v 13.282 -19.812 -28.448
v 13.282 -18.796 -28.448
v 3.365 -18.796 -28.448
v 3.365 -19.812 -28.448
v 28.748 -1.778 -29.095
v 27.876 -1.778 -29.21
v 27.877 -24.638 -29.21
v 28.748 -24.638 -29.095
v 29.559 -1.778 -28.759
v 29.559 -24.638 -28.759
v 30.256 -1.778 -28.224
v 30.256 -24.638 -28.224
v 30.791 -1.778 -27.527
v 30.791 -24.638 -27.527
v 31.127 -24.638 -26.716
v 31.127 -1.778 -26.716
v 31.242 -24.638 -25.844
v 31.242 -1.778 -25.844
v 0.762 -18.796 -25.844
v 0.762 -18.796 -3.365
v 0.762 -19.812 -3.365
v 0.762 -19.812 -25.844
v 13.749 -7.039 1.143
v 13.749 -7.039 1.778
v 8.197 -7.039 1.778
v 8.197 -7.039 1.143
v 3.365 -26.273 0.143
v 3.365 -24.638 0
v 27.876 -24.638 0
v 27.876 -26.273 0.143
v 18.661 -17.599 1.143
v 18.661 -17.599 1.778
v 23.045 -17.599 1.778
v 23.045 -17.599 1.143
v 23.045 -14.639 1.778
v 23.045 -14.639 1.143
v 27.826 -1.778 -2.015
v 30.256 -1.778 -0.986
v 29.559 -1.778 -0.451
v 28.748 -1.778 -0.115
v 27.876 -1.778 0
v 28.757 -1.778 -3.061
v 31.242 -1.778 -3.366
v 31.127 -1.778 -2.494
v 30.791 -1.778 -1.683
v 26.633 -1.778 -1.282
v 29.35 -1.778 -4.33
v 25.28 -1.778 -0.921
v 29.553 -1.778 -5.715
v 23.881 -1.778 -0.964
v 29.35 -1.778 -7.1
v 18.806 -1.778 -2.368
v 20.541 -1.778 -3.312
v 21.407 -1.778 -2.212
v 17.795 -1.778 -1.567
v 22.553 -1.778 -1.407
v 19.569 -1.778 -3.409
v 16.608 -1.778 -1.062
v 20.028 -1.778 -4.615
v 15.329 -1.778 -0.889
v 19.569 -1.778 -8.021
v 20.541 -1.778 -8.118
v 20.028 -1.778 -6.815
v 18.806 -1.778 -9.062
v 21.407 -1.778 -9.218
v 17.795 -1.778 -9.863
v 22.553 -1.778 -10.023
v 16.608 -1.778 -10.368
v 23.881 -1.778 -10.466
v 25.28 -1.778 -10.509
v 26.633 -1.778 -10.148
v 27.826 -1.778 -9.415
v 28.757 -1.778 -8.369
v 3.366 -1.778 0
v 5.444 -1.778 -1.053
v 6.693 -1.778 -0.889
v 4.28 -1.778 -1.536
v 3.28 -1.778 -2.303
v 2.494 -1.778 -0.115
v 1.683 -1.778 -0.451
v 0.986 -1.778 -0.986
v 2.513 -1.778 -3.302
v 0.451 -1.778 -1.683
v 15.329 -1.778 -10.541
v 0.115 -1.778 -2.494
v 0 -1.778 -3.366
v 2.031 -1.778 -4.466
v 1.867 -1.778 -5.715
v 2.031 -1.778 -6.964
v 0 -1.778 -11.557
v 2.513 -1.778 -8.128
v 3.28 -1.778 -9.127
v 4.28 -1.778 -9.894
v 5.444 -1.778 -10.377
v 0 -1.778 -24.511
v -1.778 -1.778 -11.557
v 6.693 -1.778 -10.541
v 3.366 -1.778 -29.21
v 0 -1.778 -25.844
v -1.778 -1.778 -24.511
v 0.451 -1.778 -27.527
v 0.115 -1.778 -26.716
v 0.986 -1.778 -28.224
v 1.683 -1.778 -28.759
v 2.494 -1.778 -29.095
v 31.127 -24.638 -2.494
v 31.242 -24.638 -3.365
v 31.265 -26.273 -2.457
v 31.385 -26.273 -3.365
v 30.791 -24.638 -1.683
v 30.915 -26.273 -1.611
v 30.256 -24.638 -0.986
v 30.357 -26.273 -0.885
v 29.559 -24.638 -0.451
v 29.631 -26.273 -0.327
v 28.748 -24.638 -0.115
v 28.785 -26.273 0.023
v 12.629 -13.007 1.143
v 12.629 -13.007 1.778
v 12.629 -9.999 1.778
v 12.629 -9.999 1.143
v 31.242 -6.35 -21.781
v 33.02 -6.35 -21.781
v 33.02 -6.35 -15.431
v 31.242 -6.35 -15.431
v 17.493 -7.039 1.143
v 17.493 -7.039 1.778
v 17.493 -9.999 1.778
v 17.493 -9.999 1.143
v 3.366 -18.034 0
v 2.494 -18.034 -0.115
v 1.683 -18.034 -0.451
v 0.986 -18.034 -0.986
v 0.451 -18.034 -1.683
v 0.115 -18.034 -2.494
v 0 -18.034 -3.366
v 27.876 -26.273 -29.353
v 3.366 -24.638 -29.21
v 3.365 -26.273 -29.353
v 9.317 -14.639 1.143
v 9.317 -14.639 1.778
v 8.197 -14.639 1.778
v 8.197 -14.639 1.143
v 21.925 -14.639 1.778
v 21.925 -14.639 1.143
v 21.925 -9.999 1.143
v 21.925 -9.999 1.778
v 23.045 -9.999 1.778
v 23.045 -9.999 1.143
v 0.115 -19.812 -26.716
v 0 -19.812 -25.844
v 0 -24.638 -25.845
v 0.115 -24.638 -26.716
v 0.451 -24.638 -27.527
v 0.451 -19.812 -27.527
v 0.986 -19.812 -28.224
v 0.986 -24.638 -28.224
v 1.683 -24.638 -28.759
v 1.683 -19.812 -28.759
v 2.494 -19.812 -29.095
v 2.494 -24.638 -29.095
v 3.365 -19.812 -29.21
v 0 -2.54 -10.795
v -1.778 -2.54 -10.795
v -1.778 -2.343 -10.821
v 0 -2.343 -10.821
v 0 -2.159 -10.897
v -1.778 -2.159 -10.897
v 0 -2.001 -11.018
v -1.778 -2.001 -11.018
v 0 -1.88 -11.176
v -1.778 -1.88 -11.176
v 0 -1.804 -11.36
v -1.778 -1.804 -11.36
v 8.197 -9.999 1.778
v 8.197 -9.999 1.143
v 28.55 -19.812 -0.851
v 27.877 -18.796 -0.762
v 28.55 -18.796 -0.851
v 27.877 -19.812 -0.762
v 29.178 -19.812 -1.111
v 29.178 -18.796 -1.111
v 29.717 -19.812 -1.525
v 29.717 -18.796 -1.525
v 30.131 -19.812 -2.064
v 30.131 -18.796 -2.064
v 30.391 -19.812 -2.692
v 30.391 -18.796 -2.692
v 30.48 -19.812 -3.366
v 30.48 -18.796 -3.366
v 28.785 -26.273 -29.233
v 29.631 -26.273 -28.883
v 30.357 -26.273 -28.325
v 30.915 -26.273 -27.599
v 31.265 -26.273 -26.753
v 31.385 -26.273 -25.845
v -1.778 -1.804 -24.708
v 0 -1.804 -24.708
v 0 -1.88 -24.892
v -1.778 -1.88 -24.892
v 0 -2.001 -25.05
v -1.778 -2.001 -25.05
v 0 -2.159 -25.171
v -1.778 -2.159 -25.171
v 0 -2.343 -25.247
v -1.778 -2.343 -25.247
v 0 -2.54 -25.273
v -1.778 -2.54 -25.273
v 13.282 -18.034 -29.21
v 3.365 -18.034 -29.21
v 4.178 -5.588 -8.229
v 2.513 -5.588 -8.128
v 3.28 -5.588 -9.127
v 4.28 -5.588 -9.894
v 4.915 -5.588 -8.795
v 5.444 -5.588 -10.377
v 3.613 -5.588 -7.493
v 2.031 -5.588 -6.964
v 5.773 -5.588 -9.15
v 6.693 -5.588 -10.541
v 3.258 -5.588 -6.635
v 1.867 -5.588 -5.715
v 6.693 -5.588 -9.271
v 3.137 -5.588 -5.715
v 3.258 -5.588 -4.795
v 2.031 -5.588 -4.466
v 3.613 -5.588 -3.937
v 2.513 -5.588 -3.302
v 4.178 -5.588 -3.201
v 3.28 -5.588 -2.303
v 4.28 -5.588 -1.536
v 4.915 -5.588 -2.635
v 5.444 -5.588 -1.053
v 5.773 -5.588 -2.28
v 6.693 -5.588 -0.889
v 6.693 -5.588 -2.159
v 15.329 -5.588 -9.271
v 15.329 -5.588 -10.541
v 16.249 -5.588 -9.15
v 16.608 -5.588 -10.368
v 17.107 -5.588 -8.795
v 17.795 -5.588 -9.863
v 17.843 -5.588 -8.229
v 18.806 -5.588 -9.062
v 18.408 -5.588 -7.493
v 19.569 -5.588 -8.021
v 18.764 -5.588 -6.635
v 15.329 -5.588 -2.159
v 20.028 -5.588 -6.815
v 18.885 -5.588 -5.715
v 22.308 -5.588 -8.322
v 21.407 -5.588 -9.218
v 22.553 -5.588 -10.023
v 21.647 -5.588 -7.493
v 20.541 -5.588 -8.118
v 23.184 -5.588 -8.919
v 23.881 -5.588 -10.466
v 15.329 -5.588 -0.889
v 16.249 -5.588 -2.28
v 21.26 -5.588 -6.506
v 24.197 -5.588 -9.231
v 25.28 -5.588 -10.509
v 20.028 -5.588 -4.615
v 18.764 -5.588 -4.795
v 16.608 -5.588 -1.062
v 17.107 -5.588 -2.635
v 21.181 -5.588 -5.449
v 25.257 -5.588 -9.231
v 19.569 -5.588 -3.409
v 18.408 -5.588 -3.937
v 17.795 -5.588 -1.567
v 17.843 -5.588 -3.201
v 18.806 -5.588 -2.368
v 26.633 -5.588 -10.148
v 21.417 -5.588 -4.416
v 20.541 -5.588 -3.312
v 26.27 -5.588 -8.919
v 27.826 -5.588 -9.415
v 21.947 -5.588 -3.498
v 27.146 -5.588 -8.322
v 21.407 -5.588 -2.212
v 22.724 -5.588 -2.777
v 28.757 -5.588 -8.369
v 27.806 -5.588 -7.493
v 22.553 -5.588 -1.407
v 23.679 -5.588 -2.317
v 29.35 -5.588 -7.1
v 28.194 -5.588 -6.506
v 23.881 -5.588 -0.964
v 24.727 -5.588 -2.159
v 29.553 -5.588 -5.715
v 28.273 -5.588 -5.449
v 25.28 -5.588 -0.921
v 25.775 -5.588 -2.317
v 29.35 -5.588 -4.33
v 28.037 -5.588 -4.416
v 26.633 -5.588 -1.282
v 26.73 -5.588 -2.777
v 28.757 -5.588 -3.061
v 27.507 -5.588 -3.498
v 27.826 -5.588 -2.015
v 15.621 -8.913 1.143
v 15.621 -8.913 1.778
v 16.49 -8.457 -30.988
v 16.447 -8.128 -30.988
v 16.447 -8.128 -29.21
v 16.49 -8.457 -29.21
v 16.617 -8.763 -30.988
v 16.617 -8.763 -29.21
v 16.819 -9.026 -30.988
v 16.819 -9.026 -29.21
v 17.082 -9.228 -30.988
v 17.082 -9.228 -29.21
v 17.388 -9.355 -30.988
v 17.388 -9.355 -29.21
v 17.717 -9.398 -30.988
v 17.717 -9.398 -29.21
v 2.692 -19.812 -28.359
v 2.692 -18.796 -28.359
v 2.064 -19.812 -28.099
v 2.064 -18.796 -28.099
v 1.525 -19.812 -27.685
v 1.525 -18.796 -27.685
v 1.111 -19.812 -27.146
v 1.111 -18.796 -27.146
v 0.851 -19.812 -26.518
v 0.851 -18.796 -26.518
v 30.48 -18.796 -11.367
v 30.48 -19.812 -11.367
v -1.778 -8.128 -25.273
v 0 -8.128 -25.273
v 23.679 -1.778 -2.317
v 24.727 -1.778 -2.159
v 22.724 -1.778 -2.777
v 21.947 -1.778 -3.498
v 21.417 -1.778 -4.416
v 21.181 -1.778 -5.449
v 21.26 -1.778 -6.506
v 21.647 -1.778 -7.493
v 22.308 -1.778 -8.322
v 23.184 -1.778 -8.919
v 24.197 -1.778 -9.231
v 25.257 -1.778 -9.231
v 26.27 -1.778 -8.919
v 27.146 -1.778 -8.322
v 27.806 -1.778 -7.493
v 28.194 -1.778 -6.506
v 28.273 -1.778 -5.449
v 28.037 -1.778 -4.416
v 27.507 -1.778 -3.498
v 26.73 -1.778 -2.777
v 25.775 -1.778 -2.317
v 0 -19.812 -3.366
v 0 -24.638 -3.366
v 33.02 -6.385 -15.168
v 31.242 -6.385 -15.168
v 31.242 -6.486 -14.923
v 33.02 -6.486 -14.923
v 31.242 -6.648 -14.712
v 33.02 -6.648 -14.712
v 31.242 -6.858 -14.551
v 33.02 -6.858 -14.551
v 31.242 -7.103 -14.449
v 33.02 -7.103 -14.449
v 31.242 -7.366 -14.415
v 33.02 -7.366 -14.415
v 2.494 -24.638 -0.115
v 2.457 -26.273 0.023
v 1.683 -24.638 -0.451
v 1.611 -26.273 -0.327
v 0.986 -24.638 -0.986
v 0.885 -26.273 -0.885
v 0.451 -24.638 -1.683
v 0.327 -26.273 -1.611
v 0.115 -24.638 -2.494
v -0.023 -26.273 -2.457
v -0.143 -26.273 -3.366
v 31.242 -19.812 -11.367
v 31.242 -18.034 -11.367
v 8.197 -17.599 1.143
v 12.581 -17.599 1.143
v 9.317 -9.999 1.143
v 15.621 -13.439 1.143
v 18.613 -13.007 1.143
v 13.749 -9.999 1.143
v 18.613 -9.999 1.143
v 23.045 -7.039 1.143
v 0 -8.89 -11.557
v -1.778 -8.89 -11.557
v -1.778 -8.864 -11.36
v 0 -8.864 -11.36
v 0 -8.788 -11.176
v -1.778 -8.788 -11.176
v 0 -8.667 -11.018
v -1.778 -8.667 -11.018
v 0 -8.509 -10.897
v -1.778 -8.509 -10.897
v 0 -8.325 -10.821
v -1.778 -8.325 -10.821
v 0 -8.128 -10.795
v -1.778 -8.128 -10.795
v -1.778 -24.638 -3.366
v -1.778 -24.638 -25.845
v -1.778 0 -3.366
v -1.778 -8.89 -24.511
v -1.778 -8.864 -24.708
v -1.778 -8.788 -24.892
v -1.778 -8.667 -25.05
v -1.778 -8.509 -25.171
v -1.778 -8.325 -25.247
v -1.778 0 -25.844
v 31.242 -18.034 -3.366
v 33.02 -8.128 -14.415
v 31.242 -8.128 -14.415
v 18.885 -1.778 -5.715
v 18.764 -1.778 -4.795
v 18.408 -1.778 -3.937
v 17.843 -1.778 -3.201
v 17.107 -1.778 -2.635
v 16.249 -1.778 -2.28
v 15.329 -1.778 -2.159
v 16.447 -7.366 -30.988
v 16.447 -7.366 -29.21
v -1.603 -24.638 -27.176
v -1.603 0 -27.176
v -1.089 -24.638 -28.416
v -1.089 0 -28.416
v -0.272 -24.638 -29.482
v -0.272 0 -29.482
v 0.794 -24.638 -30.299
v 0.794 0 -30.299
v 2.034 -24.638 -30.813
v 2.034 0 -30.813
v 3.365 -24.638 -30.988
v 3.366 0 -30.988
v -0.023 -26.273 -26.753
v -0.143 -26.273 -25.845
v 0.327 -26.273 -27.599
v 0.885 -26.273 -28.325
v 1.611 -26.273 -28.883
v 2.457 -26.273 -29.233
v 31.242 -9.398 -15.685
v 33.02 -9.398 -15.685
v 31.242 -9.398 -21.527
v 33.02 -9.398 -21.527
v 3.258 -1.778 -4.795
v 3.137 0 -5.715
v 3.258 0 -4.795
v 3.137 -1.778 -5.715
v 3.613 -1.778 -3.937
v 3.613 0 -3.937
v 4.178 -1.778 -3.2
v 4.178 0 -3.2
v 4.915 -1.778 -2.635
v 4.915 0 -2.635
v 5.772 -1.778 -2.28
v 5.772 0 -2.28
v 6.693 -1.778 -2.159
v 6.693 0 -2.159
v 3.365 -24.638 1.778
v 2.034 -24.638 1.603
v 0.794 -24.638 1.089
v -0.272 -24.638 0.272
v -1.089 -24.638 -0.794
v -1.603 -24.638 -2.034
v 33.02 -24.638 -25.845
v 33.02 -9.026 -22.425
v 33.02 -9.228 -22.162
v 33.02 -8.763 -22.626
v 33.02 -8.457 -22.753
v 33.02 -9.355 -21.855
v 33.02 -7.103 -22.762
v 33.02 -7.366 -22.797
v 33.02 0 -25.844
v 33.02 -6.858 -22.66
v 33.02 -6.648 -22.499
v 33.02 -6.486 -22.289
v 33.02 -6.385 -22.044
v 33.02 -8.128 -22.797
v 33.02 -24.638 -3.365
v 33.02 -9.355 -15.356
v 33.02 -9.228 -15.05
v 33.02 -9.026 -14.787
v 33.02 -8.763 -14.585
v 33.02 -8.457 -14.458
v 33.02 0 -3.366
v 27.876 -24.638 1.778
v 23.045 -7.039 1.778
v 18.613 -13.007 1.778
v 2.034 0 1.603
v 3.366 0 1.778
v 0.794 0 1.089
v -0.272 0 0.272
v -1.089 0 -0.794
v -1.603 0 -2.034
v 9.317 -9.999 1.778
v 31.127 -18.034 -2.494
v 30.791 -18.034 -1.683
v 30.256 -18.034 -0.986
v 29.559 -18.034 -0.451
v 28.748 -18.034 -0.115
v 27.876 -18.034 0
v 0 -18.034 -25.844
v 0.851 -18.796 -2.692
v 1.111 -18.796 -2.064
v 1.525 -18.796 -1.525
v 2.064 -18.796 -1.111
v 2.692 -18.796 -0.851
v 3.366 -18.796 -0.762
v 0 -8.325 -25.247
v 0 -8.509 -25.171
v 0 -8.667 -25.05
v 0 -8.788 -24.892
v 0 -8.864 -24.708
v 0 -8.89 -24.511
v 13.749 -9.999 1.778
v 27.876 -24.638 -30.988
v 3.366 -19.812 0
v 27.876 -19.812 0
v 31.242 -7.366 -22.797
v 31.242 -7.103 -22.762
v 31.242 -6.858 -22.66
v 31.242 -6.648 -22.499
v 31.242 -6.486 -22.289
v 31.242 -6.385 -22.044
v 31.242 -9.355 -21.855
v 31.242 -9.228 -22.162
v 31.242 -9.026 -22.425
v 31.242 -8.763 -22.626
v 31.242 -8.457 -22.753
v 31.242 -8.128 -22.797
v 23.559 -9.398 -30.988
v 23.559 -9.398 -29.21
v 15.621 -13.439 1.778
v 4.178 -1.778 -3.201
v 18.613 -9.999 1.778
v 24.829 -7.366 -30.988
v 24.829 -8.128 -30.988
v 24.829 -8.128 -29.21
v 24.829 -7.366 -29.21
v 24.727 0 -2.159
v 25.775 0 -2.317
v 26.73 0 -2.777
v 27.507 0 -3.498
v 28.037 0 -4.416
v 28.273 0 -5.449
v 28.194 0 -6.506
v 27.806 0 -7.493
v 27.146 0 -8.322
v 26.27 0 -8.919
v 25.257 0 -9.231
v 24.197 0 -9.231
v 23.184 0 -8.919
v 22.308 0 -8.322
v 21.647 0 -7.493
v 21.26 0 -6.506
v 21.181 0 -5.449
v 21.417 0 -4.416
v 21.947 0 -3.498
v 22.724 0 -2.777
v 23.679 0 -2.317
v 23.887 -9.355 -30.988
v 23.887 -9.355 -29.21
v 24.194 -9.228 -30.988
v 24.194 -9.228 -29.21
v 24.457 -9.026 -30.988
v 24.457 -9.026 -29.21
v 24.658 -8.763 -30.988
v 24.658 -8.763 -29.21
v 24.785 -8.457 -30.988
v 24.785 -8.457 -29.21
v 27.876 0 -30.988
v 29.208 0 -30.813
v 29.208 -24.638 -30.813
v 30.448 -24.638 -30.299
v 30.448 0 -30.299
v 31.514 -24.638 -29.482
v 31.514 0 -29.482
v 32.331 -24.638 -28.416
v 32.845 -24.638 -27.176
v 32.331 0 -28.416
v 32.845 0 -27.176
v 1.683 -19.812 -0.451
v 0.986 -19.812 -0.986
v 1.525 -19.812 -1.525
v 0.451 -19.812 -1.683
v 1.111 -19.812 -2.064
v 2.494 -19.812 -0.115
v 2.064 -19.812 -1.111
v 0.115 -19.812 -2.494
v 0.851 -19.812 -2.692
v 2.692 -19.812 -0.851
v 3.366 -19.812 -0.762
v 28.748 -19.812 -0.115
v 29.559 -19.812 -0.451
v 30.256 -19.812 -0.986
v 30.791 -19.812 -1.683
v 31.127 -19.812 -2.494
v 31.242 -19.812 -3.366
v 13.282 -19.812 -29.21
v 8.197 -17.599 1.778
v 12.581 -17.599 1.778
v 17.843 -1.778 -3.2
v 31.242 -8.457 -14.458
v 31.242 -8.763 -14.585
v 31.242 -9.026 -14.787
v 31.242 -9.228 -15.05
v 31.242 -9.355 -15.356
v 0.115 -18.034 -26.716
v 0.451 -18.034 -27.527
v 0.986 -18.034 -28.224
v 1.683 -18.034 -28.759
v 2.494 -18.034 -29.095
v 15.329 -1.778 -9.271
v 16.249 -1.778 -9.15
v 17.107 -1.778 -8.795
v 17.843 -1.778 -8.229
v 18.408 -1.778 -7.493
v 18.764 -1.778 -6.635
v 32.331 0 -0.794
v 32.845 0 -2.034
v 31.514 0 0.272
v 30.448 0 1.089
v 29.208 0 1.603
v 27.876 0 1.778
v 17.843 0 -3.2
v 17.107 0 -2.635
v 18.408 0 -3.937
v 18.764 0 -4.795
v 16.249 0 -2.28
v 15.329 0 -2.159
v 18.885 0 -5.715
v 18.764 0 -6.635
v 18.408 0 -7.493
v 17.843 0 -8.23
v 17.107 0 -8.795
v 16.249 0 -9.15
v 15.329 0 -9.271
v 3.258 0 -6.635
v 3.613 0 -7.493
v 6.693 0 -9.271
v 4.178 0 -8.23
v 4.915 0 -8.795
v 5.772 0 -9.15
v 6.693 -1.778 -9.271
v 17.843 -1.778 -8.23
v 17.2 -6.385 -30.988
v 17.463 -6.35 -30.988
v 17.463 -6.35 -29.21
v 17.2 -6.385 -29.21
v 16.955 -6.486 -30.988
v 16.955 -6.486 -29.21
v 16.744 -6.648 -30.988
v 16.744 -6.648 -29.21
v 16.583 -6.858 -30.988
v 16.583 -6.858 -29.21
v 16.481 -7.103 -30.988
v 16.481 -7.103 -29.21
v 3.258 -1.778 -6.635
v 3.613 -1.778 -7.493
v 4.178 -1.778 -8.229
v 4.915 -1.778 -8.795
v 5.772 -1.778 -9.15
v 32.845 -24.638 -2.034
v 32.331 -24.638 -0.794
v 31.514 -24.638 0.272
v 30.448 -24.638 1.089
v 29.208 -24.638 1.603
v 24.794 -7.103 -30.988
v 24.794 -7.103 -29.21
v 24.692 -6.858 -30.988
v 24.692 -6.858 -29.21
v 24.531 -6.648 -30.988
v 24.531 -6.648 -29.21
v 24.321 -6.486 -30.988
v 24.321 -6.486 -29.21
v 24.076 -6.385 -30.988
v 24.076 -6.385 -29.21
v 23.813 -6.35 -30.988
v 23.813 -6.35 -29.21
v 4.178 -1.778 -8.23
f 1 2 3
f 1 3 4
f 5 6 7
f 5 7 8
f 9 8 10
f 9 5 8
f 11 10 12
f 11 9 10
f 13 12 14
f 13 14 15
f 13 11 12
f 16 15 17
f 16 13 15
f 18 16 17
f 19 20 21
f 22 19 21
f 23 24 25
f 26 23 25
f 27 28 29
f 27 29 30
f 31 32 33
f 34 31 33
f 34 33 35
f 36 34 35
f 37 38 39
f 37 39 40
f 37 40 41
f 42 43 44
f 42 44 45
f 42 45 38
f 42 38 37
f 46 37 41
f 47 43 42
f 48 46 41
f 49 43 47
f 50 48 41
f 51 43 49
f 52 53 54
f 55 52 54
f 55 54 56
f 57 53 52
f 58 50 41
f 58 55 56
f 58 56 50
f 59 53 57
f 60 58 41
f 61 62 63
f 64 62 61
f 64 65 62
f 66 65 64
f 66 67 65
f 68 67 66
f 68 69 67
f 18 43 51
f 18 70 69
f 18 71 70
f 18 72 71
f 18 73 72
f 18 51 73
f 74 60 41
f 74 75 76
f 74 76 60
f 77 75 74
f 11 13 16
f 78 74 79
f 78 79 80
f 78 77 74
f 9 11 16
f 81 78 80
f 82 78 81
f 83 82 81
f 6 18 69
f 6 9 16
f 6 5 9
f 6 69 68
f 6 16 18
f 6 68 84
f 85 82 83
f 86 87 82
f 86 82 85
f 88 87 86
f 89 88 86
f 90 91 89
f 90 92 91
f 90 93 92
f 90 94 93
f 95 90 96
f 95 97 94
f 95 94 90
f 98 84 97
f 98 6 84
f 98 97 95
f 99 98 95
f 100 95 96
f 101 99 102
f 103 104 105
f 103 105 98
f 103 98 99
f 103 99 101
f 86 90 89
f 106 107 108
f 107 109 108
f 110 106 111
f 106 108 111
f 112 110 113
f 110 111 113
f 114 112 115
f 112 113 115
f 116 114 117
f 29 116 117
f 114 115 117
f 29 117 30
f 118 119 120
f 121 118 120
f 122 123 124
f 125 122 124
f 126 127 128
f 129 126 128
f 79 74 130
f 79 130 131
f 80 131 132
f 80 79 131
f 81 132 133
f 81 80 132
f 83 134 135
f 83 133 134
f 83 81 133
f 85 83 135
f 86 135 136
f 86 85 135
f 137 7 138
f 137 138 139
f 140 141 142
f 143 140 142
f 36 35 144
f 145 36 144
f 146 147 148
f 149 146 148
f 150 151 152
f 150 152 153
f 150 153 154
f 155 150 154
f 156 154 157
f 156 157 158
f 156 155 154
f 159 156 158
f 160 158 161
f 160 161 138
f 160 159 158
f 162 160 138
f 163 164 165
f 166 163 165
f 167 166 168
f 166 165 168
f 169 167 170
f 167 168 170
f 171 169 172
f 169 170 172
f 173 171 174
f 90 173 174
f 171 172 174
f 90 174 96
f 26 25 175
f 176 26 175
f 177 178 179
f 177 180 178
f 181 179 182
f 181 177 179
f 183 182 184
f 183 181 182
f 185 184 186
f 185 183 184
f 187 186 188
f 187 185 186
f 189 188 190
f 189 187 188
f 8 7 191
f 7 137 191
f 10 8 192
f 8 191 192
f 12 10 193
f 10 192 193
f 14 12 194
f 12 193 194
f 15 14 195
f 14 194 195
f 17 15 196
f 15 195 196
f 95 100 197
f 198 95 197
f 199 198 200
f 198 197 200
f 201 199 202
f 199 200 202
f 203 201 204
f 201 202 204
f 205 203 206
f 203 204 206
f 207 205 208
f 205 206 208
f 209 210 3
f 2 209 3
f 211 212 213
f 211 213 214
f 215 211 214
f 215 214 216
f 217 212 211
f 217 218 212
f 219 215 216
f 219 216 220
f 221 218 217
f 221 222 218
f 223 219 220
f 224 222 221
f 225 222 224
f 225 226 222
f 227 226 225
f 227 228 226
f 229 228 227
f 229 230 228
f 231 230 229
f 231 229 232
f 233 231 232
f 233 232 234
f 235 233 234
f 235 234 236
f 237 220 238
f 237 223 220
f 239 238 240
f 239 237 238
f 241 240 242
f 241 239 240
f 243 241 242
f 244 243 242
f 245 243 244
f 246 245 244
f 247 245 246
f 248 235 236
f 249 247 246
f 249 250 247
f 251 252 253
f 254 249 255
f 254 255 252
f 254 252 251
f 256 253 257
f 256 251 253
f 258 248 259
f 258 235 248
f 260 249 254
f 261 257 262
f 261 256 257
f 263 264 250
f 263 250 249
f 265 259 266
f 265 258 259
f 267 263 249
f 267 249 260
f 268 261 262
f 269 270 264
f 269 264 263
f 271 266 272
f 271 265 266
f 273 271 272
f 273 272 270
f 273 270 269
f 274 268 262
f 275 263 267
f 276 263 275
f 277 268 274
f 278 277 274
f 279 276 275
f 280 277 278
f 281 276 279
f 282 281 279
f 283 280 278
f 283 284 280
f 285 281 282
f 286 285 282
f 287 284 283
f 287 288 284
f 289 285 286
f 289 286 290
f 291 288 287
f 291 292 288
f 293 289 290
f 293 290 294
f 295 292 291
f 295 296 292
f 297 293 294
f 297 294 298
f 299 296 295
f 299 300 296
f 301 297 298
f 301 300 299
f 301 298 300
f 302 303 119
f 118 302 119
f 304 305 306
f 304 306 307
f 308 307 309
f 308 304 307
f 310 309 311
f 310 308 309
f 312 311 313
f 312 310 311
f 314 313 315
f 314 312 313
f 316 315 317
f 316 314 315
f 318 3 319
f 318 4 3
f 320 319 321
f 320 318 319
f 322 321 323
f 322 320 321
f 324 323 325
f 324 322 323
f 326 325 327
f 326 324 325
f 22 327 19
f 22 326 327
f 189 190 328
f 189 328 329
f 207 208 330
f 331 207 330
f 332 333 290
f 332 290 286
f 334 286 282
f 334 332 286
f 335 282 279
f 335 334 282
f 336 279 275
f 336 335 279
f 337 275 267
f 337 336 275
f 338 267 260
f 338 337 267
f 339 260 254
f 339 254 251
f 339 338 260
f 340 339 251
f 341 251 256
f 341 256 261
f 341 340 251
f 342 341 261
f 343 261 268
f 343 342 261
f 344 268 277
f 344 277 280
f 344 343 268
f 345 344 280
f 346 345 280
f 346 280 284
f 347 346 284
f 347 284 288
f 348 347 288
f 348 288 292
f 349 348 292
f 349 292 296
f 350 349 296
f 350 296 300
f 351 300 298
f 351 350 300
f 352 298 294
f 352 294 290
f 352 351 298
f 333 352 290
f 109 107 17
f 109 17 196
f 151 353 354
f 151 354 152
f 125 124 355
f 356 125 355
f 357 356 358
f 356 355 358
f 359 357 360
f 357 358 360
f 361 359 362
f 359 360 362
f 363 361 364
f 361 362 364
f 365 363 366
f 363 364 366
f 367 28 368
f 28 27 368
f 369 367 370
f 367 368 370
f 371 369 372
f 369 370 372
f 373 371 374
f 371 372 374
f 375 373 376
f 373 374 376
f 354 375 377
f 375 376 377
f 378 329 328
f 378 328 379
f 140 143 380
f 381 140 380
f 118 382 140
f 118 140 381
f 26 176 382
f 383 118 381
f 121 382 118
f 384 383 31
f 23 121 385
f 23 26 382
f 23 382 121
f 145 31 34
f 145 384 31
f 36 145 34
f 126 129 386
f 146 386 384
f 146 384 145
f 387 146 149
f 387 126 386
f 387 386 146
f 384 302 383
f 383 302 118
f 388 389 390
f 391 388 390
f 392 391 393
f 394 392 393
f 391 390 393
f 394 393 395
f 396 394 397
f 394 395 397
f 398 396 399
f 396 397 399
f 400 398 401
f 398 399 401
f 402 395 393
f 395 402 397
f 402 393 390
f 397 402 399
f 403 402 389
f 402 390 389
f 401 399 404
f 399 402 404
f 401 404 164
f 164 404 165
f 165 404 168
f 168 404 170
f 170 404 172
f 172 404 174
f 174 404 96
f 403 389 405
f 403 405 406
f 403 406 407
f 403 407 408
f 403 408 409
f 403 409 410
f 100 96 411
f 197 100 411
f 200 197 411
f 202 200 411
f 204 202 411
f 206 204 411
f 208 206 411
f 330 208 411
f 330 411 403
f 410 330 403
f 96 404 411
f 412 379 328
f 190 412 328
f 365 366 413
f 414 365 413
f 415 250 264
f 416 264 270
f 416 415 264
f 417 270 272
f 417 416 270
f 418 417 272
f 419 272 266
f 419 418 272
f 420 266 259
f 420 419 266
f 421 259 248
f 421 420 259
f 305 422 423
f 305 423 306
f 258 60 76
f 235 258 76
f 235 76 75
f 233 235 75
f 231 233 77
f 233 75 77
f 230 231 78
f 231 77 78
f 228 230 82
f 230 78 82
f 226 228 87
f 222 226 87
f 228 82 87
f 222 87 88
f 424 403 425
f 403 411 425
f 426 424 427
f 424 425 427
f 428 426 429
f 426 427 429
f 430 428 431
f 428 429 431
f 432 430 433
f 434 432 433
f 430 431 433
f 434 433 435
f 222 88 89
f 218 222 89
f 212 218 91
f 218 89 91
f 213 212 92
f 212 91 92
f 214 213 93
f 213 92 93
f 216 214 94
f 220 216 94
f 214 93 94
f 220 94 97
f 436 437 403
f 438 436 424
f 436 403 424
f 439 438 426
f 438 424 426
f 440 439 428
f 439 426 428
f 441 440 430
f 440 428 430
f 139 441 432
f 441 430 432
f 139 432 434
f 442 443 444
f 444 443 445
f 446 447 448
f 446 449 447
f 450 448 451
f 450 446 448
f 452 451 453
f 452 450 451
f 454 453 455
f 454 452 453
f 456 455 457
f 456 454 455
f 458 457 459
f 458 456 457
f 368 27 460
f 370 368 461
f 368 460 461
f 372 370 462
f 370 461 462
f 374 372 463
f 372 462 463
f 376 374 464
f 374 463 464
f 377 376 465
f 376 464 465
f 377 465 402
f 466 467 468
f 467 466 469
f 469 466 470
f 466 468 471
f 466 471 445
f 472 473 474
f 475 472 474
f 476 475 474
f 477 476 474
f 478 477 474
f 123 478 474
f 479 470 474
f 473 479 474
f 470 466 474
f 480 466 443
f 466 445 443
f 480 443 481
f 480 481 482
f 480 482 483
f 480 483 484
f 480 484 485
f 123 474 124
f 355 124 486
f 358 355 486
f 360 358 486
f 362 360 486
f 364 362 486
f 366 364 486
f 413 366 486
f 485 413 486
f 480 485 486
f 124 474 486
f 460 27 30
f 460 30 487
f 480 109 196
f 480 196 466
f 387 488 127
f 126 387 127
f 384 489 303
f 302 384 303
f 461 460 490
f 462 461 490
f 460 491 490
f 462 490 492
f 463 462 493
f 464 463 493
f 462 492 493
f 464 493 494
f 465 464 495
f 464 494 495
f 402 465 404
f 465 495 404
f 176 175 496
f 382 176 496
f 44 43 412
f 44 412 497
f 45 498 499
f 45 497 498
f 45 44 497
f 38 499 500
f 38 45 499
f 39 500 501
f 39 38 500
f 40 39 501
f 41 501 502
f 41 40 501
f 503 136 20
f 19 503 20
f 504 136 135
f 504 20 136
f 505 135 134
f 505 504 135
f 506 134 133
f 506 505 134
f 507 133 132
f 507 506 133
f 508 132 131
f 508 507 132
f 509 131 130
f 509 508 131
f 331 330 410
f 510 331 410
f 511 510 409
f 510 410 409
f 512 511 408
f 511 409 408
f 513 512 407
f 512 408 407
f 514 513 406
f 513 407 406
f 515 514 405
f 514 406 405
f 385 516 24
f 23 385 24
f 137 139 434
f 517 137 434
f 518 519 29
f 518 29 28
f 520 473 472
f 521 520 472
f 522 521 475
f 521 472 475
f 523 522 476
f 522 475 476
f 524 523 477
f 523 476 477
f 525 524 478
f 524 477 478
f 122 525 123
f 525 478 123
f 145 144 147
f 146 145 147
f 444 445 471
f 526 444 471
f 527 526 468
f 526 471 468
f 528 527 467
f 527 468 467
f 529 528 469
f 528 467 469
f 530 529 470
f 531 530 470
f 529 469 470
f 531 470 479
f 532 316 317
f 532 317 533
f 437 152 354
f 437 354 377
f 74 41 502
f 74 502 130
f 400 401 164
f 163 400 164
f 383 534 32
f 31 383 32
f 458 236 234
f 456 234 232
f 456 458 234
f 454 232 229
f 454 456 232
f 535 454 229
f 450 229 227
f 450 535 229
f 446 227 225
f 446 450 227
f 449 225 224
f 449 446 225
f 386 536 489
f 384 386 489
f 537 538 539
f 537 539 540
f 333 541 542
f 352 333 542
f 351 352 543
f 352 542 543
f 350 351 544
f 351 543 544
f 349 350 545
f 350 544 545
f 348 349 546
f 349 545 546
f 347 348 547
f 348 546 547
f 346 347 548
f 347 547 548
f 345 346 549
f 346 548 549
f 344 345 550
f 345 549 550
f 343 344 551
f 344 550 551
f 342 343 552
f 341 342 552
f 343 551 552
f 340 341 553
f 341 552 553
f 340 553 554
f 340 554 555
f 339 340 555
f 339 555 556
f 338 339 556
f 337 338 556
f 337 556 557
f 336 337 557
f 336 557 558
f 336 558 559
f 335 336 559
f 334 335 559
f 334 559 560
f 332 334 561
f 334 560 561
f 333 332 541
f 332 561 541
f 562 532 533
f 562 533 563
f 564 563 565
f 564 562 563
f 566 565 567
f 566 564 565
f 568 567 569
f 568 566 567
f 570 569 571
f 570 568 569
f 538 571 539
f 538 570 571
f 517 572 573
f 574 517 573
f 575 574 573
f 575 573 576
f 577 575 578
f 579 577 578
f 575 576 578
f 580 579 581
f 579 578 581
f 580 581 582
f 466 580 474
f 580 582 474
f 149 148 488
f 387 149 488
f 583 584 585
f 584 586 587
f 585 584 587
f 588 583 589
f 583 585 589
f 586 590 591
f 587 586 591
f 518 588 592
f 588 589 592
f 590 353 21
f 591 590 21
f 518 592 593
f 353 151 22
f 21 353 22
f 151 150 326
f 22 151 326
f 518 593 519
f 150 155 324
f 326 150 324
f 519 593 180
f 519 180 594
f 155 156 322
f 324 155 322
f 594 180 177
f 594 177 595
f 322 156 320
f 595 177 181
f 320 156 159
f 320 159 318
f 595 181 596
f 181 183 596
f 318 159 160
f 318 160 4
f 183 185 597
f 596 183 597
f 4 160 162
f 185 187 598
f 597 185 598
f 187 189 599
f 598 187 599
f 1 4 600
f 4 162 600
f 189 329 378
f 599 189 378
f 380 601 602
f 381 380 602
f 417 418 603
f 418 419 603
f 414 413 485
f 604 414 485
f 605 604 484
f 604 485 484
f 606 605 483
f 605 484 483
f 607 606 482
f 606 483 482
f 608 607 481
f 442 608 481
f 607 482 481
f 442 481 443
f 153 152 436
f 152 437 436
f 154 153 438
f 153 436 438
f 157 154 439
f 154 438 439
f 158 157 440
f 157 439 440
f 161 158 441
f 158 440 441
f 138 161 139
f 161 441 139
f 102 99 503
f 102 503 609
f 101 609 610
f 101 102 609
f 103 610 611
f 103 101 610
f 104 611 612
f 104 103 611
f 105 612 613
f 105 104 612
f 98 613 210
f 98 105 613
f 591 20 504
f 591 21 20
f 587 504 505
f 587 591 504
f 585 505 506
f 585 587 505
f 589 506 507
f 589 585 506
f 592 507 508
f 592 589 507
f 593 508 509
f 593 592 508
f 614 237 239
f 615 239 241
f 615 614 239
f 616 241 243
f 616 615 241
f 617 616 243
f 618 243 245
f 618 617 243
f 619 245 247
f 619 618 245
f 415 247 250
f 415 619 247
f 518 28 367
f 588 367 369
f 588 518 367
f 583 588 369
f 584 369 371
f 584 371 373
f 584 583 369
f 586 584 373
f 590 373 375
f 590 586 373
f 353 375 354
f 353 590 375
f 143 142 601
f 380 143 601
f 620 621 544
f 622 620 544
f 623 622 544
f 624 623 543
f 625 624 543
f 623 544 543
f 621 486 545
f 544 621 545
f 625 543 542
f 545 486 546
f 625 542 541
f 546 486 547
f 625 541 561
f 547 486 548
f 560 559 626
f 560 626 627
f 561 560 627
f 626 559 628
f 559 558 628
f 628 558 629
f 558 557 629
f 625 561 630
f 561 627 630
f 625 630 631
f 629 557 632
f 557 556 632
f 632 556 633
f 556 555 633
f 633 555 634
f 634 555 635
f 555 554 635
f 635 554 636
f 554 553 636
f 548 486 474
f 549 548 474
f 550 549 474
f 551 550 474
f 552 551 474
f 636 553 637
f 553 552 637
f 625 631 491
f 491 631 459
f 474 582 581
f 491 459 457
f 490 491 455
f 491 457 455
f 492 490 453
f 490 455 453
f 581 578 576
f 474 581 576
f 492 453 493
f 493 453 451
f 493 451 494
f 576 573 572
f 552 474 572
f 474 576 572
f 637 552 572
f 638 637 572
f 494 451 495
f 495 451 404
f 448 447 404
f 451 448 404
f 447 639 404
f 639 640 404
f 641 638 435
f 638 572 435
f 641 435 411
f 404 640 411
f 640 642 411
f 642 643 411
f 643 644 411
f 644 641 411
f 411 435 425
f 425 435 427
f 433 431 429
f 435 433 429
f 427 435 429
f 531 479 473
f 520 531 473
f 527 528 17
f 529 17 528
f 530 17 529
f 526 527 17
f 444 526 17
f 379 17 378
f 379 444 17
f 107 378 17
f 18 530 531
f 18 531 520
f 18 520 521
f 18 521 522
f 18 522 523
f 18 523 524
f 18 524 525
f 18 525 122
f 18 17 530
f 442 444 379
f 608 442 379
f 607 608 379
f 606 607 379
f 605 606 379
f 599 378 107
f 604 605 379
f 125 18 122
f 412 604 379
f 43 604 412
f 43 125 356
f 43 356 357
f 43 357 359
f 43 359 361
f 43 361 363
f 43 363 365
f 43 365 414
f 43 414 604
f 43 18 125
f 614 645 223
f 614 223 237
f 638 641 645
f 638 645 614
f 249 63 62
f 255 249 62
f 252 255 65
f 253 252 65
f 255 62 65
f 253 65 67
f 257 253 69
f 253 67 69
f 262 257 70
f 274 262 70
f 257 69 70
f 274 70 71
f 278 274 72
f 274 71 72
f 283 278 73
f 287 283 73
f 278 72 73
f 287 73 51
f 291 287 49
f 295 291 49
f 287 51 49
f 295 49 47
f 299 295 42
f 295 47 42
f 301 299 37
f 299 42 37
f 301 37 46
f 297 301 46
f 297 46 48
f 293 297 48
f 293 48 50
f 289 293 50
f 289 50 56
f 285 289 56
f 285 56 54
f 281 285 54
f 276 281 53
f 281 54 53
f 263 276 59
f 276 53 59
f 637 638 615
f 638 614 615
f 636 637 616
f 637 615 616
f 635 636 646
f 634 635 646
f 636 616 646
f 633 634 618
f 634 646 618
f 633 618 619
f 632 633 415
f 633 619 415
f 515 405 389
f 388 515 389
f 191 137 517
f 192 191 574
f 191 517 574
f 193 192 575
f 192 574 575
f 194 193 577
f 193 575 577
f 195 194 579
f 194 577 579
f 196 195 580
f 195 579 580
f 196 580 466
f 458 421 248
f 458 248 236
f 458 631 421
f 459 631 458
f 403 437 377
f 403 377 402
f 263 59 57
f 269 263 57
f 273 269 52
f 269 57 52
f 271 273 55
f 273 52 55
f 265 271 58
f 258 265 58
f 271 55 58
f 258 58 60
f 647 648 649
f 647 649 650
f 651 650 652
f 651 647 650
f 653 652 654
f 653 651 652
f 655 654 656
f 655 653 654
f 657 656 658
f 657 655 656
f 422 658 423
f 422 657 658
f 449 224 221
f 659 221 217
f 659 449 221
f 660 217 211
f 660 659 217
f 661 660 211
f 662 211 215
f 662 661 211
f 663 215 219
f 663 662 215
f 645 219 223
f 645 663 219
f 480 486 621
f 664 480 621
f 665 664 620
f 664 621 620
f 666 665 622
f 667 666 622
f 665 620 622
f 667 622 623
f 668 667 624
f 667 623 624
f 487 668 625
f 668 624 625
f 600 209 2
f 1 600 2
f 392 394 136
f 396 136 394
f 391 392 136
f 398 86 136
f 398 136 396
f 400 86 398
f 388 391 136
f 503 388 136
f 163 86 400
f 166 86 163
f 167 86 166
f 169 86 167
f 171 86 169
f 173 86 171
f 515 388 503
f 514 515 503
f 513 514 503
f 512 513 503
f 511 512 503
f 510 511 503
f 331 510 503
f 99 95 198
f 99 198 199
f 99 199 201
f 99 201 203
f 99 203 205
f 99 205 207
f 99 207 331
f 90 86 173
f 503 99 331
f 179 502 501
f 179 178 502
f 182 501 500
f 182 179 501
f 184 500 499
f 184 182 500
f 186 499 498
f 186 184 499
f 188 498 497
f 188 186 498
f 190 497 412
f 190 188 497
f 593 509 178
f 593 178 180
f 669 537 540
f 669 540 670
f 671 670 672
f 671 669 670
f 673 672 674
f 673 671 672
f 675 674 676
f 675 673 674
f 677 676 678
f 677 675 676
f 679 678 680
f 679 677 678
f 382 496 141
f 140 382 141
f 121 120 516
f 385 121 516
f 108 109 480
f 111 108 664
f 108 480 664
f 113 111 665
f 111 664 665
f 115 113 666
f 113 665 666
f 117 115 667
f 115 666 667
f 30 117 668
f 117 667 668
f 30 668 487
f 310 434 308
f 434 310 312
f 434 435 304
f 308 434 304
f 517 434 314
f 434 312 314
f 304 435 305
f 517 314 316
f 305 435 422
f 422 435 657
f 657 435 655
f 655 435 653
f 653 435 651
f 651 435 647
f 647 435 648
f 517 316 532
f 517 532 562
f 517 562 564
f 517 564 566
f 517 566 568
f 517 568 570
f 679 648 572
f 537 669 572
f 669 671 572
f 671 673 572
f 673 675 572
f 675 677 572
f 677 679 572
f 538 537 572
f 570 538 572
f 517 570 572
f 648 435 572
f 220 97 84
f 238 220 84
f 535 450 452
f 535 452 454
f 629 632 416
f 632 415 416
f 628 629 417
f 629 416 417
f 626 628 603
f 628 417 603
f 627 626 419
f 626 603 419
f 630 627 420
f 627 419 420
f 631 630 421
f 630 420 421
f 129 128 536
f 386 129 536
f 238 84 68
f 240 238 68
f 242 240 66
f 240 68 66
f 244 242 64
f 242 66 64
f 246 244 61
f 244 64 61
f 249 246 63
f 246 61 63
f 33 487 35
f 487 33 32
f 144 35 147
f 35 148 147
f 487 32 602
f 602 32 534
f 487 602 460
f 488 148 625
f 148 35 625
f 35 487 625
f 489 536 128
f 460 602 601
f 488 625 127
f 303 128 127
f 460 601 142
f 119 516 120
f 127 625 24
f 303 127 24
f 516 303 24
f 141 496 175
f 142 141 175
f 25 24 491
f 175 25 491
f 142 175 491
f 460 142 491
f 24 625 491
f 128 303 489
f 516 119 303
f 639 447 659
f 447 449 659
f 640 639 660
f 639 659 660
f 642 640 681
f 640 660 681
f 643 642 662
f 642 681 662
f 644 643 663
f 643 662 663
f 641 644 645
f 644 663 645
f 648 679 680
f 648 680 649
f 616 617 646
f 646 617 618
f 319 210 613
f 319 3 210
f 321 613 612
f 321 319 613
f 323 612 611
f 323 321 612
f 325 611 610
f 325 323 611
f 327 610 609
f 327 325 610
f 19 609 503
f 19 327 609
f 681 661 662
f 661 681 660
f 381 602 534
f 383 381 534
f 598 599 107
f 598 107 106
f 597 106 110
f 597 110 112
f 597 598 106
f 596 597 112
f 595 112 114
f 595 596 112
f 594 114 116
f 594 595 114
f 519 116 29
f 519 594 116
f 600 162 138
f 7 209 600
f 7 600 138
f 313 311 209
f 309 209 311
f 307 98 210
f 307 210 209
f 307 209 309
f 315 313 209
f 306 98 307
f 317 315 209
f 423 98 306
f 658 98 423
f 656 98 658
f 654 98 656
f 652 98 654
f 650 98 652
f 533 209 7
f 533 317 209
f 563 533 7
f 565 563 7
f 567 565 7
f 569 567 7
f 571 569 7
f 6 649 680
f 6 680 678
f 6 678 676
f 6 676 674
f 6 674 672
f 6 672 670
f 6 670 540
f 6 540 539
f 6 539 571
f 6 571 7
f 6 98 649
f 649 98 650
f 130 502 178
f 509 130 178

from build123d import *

# Parameters (mm, degrees)
BOSS_EXTRUDE1_DEPTH = 1.778
BOSS_EXTRUDE2_DEPTH = 22.86
SKETCH5_R           = 3.556
SKETCH5_W           = 15.748
SKETCH5_H           = 7.112
CUT_EXTRUDE1_DEPTH  = 1.778
FILLET1_R           = 3.556
CUT_EXTRUDE2_DEPTH  = 12.7
CUT_EXTRUDE3_DEPTH  = 12.7
SKETCH9_R           = 3.556
BOSS_EXTRUDE3_DEPTH = 3.81
CUT_EXTRUDE4_DEPTH  = 0.635


with BuildPart() as part:
    # Sketch1 → Boss-Extrude1 (new body)
    with BuildSketch(Plane(origin=(0, 0, 0), x_dir=(1, 0, 0), z_dir=(0, 1, 0))):
        with BuildLine():
            Line((-1.778, 3.3655), (-1.778, 25.8445))
            ThreePointArc((-1.778, 25.8445), (-0.271503729, 29.481503729), (3.3655, 30.988))
            Line((3.3655, 30.988), (27.8765, 30.988))
            ThreePointArc((27.8765, 30.988), (31.513503729, 29.481503729), (33.02, 25.8445))
            Line((33.02, 25.8445), (33.02, 3.3655))
            ThreePointArc((33.02, 3.3655), (31.513503729, -0.271503729), (27.8765, -1.778))
            Line((27.8765, -1.778), (3.3655, -1.778))
            ThreePointArc((3.3655, -1.778), (-0.271503729, -0.271503729), (-1.778, 3.3655))
        make_face()
    extrude(amount=-BOSS_EXTRUDE1_DEPTH)

    # Sketch3 → Boss-Extrude2 (add)
    with BuildSketch(Plane.XZ.offset(1.778)):
        with BuildLine():
            Line((27.8765, 1.778), (3.3655, 1.778))
            ThreePointArc((3.3655, 1.778), (-0.271503729, 0.271503729), (-1.778, -3.3655))
            Line((-1.778, -3.3655), (-1.778, -25.8445))
            ThreePointArc((-1.778, -25.8445), (-0.271503729, -29.481503729), (3.3655, -30.988))
            Line((3.3655, -30.988), (27.8765, -30.988))
            ThreePointArc((27.8765, -30.988), (31.513503729, -29.481503729), (33.02, -25.8445))
            Line((33.02, -25.8445), (33.02, -3.3655))
            ThreePointArc((33.02, -3.3655), (31.513503729, 0.271503729), (27.8765, 1.778))
        make_face()
        with BuildLine():
            Line((0, -3.3655), (0, -25.8445))
            ThreePointArc((0, -25.8445), (0.985732128, -28.224267872), (3.3655, -29.21))
            Line((3.3655, -29.21), (27.8765, -29.21))
            ThreePointArc((27.8765, -29.21), (30.256267872, -28.224267872), (31.242, -25.8445))
            Line((31.242, -25.8445), (31.242, -3.3655))
            ThreePointArc((31.242, -3.3655), (30.256267872, -0.985732128), (27.8765, 0))
            Line((27.8765, 0), (3.3655, 0))
            ThreePointArc((3.3655, 0), (0.985732128, -0.985732128), (0, -3.3655))
        make_face(mode=Mode.SUBTRACT)
    extrude(amount=BOSS_EXTRUDE2_DEPTH)

    # Sketch5 → Cut-Extrude1 (cut)
    with BuildSketch(Plane(origin=(0, 0, 0), x_dir=(1, 0, 0), z_dir=(0, 1, 0))):
        with Locations(Location((24.7269, 5.715, 0), (0, 0, 270))):
            Circle(SKETCH5_R)
        with Locations((11.0109, 5.715)):
            Rectangle(SKETCH5_W, SKETCH5_H)
    extrude(amount=-CUT_EXTRUDE1_DEPTH, mode=Mode.SUBTRACT)

    # Fillet1
    fillet1_edges = [part.edges().sort_by_distance(p)[0] for p in [
        (3.1369, -0.889, -2.159),
        (18.8849, -0.889, -2.159),
        (18.8849, -0.889, -9.271),
        (3.1369, -0.889, -9.271),
    ]]
    fillet(fillet1_edges, radius=FILLET1_R - 0.0001)  # a hair under: the kernel refuses the full size

    # Sketch6 → Cut-Extrude2 (cut)
    with BuildSketch(Plane.ZY.offset(1.778)):
        with BuildLine():
            Line((-11.557, -1.778), (-24.511, -1.778))
            ThreePointArc((-24.511, -1.778), (-25.049815367, -2.001184633), (-25.273, -2.54))
            Line((-25.273, -2.54), (-25.273, -8.128))
            ThreePointArc((-25.273, -8.128), (-25.049815367, -8.666815367), (-24.511, -8.89))
            Line((-24.511, -8.89), (-11.557, -8.89))
            ThreePointArc((-11.557, -8.89), (-11.018184633, -8.666815367), (-10.795, -8.128))
            Line((-10.795, -8.128), (-10.795, -2.54))
            ThreePointArc((-10.795, -2.54), (-11.018184633, -2.001184633), (-11.557, -1.778))
        make_face()
    extrude(amount=-CUT_EXTRUDE2_DEPTH, mode=Mode.SUBTRACT)

    # Sketch7 → Cut-Extrude3 (cut)
    with BuildSketch(Plane(origin=(0, 0, -30.988), x_dir=(-1, 0, 0), z_dir=(0, 0, -1))):
        with BuildLine():
            Line((-23.8125889, -6.35), (-17.4625889, -6.35))
            ThreePointArc((-17.4625889, -6.35), (-16.74416841, -6.64757951), (-16.4465889, -7.366))
            Line((-16.4465889, -7.366), (-16.4465889, -8.128))
            ThreePointArc((-16.4465889, -8.128), (-16.818563288, -9.026025612), (-17.7165889, -9.398))
            Line((-17.7165889, -9.398), (-23.5585889, -9.398))
            ThreePointArc((-23.5585889, -9.398), (-24.456614512, -9.026025612), (-24.8285889, -8.128))
            Line((-24.8285889, -8.128), (-24.8285889, -7.366))
            ThreePointArc((-24.8285889, -7.366), (-24.53100939, -6.64757951), (-23.8125889, -6.35))
        make_face()
    cut_extrude3 = extrude(amount=-CUT_EXTRUDE3_DEPTH, mode=Mode.SUBTRACT)

    # Mirror1: Cut-Extrude3 across plane
    add(cut_extrude3.mirror(Plane(origin=(1.016, 0, 1.016), x_dir=(-0.7071067811865437, 0, 0.7071067811865512), z_dir=(-0.7071067811865512, 0, -0.7071067811865438))), mode=Mode.SUBTRACT)

    # Sketch9 → Boss-Extrude3 (add)
    with BuildSketch(Plane.XZ.offset(1.778)):
        with BuildLine():
            Line((6.6929, -10.541), (15.3289, -10.541))
            ThreePointArc((15.3289, -10.541), (18.327432056, -9.496412634), (20.0279, -6.814852263))
            ThreePointArc((20.0279, -6.814852263), (29.5529, -5.715), (20.0279, -4.615147737))
            ThreePointArc((20.0279, -4.615147737), (18.327432056, -1.933587366), (15.3289, -0.889))
            Line((15.3289, -0.889), (6.6929, -0.889))
            ThreePointArc((6.6929, -0.889), (3.280402674, -2.302502674), (1.8669, -5.715))
            ThreePointArc((1.8669, -5.715), (3.280402674, -9.127497326), (6.6929, -10.541))
        make_face()
        with Locations(Location((24.7269, -5.715, 0), (0, 0, 90))):
            Circle(SKETCH9_R, mode=Mode.SUBTRACT)
        with BuildLine():
            Line((6.6929, -9.271), (15.3289, -9.271))
            ThreePointArc((15.3289, -9.271), (17.843371714, -8.229471714), (18.8849, -5.715))
            ThreePointArc((18.8849, -5.715), (17.843371714, -3.200528286), (15.3289, -2.159))
            Line((15.3289, -2.159), (6.6929, -2.159))
            ThreePointArc((6.6929, -2.159), (4.178428286, -3.200528286), (3.1369, -5.715))
            ThreePointArc((3.1369, -5.715), (4.178428286, -8.229471714), (6.6929, -9.271))
        make_face(mode=Mode.SUBTRACT)
    extrude(amount=BOSS_EXTRUDE3_DEPTH)

    # Sweep1: sweep along a path in Sketch12
    with BuildLine(Plane.XZ.offset(24.638)) as sweep1_path:
        Line((31.242, -25.8445), (31.242, -3.3655))
        ThreePointArc((31.242, -3.3655), (30.256267872, -0.985732128), (27.8765, 0))
        Line((27.8765, 0), (3.3655, 0))
        ThreePointArc((3.3655, 0), (0.985732128, -0.985732128), (0, -3.3655))
        Line((0, -3.3655), (0, -25.8445))
        ThreePointArc((0, -25.8445), (0.985732128, -28.224267872), (3.3655, -29.21))
        Line((3.3655, -29.21), (27.8765, -29.21))
        ThreePointArc((27.8765, -29.21), (30.256267872, -28.224267872), (31.242, -25.8445))
    # Sketch11 → Sweep1 (sweep)
    with BuildSketch(Plane(origin=(0, 0, -9.652), x_dir=(-1, 0, 0), z_dir=(0, 0, -1))):
        Polygon((1.778, -24.638), (0, -24.638), (0.143040428, -26.272959572), align=None)
    sweep(path=sweep1_path.line)

    # Sweep2: sweep along a path in Sketch14
    with BuildLine(Plane(origin=(0, -19.812, 0), x_dir=(-1, 0, 0), z_dir=(0, -1, 0))) as sweep2_path:
        Line((-13.282231977, 29.21), (-3.3655, 29.21))
        ThreePointArc((-3.3655, 29.21), (-0.985732128, 28.224267872), (0, 25.8445))
        Line((0, 25.8445), (0, 3.3655))
        ThreePointArc((0, 3.3655), (-0.985732128, 0.985732128), (-3.3655, 0))
        Line((-3.3655, 0), (-27.8765, 0))
        ThreePointArc((-27.8765, 0), (-30.256267872, 0.985732128), (-31.242, 3.3655))
        Line((-31.242, 3.3655), (-31.242, 11.366960451))
    # Sketch15 → Sweep2 (sweep)
    with BuildSketch(Plane(origin=(13.282231977, 0, 0), x_dir=(0, 0, -1), z_dir=(1, 0, 0))):
        Polygon((29.21, -19.812), (29.21, -18.034), (28.448, -18.796), (28.448, -19.812), align=None)
    sweep(path=sweep2_path.line)

    # Sketch16 → Cut-Extrude4 (cut)
    with BuildSketch(Plane.XY.offset(1.778)):
        Polygon((23.045, -17.599), (23.045, -14.639), (21.925, -14.639), (21.925, -9.999), (23.045, -9.999), (23.045, -7.039), (17.493, -7.039), (17.493, -9.999), (18.613, -9.999), (18.613, -13.007), (15.621, -8.912684211), (12.629, -13.007), (12.629, -9.999), (13.749, -9.999), (13.749, -7.039), (8.197, -7.039), (8.197, -9.999), (9.317, -9.999), (9.317, -14.639), (8.197, -14.639), (8.197, -17.599), (12.581, -17.599), (15.621, -13.439), (18.661, -17.599), align=None)
    extrude(amount=-CUT_EXTRUDE4_DEPTH, mode=Mode.SUBTRACT)


solid = part.part
